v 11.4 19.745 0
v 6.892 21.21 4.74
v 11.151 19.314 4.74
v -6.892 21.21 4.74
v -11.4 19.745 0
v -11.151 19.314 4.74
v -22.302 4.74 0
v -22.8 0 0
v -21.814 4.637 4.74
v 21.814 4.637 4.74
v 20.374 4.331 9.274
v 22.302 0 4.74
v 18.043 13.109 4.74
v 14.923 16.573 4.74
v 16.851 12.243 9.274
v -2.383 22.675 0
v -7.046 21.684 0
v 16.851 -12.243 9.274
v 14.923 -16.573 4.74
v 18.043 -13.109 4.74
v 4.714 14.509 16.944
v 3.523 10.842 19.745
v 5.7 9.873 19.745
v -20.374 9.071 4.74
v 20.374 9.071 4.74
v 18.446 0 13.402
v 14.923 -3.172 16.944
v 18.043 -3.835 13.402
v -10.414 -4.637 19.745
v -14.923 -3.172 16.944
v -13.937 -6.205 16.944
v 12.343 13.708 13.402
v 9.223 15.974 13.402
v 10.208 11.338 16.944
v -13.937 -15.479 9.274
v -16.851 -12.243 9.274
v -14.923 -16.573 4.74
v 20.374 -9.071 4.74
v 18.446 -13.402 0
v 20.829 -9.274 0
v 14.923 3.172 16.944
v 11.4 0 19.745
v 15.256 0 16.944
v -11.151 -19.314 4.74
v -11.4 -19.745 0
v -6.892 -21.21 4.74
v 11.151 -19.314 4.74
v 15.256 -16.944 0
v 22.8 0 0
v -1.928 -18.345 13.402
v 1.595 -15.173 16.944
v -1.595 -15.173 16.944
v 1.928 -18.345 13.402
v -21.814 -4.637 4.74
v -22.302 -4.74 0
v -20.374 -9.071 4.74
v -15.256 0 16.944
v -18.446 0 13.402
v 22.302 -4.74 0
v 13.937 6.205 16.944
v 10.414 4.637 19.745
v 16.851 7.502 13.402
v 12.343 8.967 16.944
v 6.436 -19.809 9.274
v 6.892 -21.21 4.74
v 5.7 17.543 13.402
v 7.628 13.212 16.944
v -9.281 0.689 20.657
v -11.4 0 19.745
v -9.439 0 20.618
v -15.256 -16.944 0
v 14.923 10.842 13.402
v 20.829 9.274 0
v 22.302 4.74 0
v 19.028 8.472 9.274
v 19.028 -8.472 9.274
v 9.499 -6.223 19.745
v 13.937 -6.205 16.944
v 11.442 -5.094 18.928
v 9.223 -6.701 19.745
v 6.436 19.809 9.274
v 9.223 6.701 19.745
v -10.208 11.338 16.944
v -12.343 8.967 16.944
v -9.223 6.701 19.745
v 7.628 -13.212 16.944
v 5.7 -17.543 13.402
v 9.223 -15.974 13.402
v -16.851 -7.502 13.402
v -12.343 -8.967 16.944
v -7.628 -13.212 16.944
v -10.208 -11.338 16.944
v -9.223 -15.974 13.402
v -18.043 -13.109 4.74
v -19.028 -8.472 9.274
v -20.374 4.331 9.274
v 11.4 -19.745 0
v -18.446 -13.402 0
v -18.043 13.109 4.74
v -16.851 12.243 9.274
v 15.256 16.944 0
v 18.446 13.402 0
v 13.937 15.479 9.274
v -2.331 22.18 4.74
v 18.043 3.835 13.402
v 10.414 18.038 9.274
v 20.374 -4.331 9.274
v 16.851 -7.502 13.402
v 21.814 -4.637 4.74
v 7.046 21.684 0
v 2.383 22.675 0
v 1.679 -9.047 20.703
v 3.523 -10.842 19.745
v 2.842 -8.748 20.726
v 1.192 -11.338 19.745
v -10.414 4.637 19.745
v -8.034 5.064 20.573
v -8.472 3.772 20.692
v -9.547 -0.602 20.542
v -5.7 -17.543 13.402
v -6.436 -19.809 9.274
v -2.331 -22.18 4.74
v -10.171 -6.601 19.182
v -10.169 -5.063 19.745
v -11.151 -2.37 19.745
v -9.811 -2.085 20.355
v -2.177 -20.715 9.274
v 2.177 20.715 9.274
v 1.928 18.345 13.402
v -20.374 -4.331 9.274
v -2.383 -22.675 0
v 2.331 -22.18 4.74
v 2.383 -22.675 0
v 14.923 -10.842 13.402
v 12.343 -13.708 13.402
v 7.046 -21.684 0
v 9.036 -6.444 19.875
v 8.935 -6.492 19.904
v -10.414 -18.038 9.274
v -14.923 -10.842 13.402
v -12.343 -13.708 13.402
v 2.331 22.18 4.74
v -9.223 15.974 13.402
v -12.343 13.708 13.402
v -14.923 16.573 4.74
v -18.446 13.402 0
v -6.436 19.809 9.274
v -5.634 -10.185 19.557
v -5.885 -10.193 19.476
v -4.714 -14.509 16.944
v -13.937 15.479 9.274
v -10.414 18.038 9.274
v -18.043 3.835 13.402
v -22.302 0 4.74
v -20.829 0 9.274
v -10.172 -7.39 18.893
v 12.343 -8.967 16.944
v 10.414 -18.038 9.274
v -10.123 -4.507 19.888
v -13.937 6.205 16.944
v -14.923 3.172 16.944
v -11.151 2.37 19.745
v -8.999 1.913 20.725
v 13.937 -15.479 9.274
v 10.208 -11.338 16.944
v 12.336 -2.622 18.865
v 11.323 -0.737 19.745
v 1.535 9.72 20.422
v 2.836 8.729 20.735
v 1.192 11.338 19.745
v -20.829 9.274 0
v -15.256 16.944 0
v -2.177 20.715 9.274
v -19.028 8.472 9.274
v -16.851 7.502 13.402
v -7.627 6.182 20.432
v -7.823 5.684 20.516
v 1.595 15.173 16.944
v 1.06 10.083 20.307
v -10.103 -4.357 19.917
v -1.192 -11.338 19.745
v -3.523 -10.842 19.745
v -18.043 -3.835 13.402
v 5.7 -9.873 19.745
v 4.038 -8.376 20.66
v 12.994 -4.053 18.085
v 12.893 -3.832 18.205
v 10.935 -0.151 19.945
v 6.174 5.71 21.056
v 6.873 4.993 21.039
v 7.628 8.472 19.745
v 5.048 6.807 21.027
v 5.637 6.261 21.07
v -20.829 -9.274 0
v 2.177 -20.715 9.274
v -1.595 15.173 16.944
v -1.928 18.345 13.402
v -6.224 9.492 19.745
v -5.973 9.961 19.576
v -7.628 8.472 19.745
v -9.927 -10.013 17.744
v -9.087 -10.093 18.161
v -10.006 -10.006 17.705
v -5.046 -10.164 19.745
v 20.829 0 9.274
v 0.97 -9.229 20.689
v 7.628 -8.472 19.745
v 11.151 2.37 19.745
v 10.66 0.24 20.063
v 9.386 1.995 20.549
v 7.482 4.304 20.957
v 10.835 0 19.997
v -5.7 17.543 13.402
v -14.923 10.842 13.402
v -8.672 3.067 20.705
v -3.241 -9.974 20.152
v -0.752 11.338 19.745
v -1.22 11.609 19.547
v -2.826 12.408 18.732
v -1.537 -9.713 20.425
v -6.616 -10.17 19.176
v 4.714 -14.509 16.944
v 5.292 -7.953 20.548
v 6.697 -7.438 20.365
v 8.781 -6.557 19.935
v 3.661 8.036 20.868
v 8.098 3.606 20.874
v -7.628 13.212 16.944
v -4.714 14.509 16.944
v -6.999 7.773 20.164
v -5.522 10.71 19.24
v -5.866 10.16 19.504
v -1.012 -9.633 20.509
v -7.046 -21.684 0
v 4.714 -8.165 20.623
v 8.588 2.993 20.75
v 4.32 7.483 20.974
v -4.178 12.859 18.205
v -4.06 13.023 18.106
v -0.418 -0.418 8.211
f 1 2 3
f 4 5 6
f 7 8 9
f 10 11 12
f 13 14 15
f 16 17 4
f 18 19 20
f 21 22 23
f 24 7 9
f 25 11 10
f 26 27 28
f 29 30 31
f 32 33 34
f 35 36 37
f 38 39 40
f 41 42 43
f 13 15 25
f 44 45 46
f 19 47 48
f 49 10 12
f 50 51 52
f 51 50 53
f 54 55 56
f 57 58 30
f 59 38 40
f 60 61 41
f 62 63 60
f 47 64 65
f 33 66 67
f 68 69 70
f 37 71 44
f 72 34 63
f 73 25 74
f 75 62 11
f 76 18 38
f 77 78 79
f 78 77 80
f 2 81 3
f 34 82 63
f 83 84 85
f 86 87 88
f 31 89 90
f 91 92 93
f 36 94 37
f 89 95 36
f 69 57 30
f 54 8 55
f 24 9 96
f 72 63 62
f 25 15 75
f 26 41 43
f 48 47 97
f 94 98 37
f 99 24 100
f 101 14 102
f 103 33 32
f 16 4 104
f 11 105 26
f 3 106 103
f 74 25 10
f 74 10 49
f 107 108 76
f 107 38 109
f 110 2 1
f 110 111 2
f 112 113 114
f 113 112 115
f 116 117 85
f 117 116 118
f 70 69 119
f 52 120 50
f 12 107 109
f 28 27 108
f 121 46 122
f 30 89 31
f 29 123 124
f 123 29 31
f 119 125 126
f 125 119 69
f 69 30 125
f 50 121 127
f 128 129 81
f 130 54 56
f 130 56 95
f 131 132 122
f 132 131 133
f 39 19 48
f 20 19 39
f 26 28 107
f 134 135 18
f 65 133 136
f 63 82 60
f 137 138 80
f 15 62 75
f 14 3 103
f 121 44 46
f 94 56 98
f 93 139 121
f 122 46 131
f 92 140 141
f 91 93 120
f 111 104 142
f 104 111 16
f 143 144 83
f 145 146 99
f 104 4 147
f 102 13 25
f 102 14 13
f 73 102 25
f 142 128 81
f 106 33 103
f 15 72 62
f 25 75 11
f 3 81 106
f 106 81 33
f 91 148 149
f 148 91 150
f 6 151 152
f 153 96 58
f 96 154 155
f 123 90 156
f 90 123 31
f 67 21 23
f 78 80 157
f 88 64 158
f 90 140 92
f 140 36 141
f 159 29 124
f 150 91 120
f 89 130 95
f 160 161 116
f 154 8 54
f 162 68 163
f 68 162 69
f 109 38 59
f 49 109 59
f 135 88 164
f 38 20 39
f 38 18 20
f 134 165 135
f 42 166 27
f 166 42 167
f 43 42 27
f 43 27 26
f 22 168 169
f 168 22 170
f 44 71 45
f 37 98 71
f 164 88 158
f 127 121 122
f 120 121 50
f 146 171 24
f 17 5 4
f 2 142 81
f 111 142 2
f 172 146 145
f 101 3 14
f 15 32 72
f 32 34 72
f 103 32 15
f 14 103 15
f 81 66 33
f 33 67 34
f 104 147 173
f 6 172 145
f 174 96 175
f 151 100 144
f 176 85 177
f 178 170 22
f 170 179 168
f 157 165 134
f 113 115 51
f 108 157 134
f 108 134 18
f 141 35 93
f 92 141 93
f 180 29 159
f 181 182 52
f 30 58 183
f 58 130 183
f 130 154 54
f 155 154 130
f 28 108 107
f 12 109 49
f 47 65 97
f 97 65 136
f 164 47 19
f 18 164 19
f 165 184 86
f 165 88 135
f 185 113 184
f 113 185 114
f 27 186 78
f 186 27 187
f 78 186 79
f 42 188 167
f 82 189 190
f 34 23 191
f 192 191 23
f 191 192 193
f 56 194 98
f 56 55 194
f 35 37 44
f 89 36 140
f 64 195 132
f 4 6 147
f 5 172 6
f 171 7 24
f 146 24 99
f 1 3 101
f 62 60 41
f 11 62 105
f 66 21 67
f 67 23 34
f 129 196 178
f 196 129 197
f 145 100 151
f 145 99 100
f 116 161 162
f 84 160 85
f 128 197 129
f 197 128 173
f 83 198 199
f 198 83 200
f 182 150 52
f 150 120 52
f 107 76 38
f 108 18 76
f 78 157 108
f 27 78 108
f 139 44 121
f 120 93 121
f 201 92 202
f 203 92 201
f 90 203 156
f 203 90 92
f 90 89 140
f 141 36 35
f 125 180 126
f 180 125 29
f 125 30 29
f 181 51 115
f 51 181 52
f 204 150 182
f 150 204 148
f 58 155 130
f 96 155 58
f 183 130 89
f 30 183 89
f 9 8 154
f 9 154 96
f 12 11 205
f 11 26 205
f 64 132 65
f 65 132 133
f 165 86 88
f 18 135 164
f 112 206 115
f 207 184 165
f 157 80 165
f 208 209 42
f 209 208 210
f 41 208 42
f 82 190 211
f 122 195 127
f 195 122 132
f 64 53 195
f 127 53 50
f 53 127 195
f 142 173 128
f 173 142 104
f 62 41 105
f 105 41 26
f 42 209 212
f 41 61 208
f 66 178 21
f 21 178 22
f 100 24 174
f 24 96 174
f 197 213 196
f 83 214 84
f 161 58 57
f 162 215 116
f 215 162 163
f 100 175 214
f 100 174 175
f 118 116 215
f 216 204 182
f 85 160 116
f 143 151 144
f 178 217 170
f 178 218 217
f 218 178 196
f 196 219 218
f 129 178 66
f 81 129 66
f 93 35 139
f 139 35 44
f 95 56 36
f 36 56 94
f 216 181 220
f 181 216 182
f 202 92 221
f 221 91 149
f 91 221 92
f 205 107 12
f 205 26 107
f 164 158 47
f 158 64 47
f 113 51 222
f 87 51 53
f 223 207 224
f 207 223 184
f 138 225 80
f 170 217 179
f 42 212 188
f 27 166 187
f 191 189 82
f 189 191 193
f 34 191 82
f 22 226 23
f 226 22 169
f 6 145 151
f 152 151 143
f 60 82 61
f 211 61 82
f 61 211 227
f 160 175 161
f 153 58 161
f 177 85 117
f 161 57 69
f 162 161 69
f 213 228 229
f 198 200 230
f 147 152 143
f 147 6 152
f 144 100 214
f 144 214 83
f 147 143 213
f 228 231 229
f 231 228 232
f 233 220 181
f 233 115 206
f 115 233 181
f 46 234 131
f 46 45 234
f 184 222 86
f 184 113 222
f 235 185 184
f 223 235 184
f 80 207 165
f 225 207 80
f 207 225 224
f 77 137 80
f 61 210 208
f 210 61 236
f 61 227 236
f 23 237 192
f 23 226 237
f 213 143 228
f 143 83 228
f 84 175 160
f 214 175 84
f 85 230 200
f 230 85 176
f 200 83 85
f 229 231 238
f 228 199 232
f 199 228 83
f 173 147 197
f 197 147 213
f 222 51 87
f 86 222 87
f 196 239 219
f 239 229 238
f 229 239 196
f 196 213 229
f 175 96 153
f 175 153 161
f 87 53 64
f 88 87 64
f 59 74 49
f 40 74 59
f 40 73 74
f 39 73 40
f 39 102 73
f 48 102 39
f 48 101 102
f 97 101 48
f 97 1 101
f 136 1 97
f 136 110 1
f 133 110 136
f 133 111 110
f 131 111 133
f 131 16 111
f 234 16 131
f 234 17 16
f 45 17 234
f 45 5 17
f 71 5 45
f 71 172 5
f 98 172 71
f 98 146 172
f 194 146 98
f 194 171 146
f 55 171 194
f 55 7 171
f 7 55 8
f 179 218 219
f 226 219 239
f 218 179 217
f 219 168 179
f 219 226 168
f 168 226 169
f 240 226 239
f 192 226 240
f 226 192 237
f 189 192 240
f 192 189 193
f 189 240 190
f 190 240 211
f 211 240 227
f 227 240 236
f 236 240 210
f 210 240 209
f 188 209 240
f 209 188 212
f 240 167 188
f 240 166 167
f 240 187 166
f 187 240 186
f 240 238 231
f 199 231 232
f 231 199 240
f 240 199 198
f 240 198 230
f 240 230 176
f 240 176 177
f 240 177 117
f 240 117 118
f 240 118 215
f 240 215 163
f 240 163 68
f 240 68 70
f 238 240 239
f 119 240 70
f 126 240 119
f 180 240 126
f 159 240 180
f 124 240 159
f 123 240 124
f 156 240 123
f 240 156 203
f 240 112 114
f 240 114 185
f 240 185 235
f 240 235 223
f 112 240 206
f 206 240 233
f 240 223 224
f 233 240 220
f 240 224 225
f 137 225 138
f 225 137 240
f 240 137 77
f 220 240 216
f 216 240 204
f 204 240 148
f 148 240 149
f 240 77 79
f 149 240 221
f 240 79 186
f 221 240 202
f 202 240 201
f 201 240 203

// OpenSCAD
/*
 * Rubik's Cube Stand
 * Copyright (c) 2019 Anar Software LLC. < http://anars.com >
 *
 * This program is free software: you can redistribute it and/or modify it under
 * the terms of the GNU General Public License as published by the Free Software
 * Foundation, either version 3 of the License, or (at your option) any later
 * version.
 *
 * This program is distributed in the hope that it will be useful, but WITHOUT
 * ANY WARRANTY; without even the implied warranty of MERCHANTABILITY or FITNESS
 * FOR A PARTICULAR PURPOSE. See the GNU General Public License for more details.
 *
 * You should have received a copy of the GNU General Public License along with
 * this program. If not, see < http://www.gnu.org/licenses/ >
 *
 */

/* [Global] */

/* [Cube Settings] */
// Cube Measurement (mm)
cube = 57; // [0:1:]

/* [Facets Settings] */
// Minimum angle for a fragment
$fa = 12;
// Minimum size of a fragment
$fs = 2;
// Number of fragments
$fn = 0;

/* [Hidden] */
piece = cube / 3;
stand = cube * 0.4;

difference(){
    difference(){
        sphere(stand);
        translate([-1 * stand, -1 * stand, -1 * stand])
            cube([2 * stand, 2 * stand, stand]);
    }
    translate([0, 0, cube])
        rotate([45, 35, 45])
    translate([cube / -2, cube / -2, cube / -2])
        for(x = [0:2])
            for(y = [0:2])
                for(z = [0:2])
                    translate([x * piece, y * piece, z * piece ])
                        #cube(piece - 1);
}
